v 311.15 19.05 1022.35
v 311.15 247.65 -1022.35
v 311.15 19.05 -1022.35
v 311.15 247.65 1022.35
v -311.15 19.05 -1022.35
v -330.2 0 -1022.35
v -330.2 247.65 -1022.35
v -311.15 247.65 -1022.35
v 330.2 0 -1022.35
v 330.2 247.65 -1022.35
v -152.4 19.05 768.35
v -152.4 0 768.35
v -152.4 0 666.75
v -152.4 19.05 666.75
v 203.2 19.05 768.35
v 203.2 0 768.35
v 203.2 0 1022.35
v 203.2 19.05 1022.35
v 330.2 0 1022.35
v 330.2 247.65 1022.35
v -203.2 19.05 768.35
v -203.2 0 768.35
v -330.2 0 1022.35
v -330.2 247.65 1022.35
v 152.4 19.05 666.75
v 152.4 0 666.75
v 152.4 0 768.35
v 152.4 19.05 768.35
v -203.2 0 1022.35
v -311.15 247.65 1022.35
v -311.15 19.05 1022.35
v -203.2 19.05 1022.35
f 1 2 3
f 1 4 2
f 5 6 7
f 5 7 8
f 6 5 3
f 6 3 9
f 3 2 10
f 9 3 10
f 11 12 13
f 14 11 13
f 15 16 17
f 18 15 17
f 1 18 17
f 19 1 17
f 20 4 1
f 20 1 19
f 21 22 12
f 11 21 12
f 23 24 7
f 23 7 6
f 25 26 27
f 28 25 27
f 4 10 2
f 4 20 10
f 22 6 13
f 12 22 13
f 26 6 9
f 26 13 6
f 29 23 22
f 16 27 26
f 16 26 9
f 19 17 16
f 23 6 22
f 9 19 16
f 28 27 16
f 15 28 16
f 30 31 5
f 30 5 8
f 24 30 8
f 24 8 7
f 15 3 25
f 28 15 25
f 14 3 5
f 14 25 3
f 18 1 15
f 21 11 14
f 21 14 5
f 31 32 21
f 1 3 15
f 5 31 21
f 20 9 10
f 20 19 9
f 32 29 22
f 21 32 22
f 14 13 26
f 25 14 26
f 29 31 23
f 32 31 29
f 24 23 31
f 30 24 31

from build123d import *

# Parameters (mm, degrees)
F1_DEPTH = 1022.35
F3_DEPTH = 25.4


with BuildPart() as f1:
    # F0 (on Top) → F1 (new body, symmetric)
    with BuildSketch(Plane.XY):
        Polygon((311.15, 247.65), (311.15, 19.05), (-311.15, 19.05), (-311.15, 247.65), (-330.2, 247.65), (-330.2, 0), (330.2, 0), (330.2, 247.65), align=None)
    extrude(amount=F1_DEPTH, both=True)

    # F2 (on face) → F3 (cut)
    with BuildSketch(Plane.XZ):
        Polygon((203.2, 1022.35), (-203.2, 1022.35), (-203.2, 768.35), (-152.4, 768.35), (-152.4, 666.75), (152.4, 666.75), (152.4, 768.35), (203.2, 768.35), align=None)
    extrude(amount=-F3_DEPTH, mode=Mode.SUBTRACT)


solid = f1.part
